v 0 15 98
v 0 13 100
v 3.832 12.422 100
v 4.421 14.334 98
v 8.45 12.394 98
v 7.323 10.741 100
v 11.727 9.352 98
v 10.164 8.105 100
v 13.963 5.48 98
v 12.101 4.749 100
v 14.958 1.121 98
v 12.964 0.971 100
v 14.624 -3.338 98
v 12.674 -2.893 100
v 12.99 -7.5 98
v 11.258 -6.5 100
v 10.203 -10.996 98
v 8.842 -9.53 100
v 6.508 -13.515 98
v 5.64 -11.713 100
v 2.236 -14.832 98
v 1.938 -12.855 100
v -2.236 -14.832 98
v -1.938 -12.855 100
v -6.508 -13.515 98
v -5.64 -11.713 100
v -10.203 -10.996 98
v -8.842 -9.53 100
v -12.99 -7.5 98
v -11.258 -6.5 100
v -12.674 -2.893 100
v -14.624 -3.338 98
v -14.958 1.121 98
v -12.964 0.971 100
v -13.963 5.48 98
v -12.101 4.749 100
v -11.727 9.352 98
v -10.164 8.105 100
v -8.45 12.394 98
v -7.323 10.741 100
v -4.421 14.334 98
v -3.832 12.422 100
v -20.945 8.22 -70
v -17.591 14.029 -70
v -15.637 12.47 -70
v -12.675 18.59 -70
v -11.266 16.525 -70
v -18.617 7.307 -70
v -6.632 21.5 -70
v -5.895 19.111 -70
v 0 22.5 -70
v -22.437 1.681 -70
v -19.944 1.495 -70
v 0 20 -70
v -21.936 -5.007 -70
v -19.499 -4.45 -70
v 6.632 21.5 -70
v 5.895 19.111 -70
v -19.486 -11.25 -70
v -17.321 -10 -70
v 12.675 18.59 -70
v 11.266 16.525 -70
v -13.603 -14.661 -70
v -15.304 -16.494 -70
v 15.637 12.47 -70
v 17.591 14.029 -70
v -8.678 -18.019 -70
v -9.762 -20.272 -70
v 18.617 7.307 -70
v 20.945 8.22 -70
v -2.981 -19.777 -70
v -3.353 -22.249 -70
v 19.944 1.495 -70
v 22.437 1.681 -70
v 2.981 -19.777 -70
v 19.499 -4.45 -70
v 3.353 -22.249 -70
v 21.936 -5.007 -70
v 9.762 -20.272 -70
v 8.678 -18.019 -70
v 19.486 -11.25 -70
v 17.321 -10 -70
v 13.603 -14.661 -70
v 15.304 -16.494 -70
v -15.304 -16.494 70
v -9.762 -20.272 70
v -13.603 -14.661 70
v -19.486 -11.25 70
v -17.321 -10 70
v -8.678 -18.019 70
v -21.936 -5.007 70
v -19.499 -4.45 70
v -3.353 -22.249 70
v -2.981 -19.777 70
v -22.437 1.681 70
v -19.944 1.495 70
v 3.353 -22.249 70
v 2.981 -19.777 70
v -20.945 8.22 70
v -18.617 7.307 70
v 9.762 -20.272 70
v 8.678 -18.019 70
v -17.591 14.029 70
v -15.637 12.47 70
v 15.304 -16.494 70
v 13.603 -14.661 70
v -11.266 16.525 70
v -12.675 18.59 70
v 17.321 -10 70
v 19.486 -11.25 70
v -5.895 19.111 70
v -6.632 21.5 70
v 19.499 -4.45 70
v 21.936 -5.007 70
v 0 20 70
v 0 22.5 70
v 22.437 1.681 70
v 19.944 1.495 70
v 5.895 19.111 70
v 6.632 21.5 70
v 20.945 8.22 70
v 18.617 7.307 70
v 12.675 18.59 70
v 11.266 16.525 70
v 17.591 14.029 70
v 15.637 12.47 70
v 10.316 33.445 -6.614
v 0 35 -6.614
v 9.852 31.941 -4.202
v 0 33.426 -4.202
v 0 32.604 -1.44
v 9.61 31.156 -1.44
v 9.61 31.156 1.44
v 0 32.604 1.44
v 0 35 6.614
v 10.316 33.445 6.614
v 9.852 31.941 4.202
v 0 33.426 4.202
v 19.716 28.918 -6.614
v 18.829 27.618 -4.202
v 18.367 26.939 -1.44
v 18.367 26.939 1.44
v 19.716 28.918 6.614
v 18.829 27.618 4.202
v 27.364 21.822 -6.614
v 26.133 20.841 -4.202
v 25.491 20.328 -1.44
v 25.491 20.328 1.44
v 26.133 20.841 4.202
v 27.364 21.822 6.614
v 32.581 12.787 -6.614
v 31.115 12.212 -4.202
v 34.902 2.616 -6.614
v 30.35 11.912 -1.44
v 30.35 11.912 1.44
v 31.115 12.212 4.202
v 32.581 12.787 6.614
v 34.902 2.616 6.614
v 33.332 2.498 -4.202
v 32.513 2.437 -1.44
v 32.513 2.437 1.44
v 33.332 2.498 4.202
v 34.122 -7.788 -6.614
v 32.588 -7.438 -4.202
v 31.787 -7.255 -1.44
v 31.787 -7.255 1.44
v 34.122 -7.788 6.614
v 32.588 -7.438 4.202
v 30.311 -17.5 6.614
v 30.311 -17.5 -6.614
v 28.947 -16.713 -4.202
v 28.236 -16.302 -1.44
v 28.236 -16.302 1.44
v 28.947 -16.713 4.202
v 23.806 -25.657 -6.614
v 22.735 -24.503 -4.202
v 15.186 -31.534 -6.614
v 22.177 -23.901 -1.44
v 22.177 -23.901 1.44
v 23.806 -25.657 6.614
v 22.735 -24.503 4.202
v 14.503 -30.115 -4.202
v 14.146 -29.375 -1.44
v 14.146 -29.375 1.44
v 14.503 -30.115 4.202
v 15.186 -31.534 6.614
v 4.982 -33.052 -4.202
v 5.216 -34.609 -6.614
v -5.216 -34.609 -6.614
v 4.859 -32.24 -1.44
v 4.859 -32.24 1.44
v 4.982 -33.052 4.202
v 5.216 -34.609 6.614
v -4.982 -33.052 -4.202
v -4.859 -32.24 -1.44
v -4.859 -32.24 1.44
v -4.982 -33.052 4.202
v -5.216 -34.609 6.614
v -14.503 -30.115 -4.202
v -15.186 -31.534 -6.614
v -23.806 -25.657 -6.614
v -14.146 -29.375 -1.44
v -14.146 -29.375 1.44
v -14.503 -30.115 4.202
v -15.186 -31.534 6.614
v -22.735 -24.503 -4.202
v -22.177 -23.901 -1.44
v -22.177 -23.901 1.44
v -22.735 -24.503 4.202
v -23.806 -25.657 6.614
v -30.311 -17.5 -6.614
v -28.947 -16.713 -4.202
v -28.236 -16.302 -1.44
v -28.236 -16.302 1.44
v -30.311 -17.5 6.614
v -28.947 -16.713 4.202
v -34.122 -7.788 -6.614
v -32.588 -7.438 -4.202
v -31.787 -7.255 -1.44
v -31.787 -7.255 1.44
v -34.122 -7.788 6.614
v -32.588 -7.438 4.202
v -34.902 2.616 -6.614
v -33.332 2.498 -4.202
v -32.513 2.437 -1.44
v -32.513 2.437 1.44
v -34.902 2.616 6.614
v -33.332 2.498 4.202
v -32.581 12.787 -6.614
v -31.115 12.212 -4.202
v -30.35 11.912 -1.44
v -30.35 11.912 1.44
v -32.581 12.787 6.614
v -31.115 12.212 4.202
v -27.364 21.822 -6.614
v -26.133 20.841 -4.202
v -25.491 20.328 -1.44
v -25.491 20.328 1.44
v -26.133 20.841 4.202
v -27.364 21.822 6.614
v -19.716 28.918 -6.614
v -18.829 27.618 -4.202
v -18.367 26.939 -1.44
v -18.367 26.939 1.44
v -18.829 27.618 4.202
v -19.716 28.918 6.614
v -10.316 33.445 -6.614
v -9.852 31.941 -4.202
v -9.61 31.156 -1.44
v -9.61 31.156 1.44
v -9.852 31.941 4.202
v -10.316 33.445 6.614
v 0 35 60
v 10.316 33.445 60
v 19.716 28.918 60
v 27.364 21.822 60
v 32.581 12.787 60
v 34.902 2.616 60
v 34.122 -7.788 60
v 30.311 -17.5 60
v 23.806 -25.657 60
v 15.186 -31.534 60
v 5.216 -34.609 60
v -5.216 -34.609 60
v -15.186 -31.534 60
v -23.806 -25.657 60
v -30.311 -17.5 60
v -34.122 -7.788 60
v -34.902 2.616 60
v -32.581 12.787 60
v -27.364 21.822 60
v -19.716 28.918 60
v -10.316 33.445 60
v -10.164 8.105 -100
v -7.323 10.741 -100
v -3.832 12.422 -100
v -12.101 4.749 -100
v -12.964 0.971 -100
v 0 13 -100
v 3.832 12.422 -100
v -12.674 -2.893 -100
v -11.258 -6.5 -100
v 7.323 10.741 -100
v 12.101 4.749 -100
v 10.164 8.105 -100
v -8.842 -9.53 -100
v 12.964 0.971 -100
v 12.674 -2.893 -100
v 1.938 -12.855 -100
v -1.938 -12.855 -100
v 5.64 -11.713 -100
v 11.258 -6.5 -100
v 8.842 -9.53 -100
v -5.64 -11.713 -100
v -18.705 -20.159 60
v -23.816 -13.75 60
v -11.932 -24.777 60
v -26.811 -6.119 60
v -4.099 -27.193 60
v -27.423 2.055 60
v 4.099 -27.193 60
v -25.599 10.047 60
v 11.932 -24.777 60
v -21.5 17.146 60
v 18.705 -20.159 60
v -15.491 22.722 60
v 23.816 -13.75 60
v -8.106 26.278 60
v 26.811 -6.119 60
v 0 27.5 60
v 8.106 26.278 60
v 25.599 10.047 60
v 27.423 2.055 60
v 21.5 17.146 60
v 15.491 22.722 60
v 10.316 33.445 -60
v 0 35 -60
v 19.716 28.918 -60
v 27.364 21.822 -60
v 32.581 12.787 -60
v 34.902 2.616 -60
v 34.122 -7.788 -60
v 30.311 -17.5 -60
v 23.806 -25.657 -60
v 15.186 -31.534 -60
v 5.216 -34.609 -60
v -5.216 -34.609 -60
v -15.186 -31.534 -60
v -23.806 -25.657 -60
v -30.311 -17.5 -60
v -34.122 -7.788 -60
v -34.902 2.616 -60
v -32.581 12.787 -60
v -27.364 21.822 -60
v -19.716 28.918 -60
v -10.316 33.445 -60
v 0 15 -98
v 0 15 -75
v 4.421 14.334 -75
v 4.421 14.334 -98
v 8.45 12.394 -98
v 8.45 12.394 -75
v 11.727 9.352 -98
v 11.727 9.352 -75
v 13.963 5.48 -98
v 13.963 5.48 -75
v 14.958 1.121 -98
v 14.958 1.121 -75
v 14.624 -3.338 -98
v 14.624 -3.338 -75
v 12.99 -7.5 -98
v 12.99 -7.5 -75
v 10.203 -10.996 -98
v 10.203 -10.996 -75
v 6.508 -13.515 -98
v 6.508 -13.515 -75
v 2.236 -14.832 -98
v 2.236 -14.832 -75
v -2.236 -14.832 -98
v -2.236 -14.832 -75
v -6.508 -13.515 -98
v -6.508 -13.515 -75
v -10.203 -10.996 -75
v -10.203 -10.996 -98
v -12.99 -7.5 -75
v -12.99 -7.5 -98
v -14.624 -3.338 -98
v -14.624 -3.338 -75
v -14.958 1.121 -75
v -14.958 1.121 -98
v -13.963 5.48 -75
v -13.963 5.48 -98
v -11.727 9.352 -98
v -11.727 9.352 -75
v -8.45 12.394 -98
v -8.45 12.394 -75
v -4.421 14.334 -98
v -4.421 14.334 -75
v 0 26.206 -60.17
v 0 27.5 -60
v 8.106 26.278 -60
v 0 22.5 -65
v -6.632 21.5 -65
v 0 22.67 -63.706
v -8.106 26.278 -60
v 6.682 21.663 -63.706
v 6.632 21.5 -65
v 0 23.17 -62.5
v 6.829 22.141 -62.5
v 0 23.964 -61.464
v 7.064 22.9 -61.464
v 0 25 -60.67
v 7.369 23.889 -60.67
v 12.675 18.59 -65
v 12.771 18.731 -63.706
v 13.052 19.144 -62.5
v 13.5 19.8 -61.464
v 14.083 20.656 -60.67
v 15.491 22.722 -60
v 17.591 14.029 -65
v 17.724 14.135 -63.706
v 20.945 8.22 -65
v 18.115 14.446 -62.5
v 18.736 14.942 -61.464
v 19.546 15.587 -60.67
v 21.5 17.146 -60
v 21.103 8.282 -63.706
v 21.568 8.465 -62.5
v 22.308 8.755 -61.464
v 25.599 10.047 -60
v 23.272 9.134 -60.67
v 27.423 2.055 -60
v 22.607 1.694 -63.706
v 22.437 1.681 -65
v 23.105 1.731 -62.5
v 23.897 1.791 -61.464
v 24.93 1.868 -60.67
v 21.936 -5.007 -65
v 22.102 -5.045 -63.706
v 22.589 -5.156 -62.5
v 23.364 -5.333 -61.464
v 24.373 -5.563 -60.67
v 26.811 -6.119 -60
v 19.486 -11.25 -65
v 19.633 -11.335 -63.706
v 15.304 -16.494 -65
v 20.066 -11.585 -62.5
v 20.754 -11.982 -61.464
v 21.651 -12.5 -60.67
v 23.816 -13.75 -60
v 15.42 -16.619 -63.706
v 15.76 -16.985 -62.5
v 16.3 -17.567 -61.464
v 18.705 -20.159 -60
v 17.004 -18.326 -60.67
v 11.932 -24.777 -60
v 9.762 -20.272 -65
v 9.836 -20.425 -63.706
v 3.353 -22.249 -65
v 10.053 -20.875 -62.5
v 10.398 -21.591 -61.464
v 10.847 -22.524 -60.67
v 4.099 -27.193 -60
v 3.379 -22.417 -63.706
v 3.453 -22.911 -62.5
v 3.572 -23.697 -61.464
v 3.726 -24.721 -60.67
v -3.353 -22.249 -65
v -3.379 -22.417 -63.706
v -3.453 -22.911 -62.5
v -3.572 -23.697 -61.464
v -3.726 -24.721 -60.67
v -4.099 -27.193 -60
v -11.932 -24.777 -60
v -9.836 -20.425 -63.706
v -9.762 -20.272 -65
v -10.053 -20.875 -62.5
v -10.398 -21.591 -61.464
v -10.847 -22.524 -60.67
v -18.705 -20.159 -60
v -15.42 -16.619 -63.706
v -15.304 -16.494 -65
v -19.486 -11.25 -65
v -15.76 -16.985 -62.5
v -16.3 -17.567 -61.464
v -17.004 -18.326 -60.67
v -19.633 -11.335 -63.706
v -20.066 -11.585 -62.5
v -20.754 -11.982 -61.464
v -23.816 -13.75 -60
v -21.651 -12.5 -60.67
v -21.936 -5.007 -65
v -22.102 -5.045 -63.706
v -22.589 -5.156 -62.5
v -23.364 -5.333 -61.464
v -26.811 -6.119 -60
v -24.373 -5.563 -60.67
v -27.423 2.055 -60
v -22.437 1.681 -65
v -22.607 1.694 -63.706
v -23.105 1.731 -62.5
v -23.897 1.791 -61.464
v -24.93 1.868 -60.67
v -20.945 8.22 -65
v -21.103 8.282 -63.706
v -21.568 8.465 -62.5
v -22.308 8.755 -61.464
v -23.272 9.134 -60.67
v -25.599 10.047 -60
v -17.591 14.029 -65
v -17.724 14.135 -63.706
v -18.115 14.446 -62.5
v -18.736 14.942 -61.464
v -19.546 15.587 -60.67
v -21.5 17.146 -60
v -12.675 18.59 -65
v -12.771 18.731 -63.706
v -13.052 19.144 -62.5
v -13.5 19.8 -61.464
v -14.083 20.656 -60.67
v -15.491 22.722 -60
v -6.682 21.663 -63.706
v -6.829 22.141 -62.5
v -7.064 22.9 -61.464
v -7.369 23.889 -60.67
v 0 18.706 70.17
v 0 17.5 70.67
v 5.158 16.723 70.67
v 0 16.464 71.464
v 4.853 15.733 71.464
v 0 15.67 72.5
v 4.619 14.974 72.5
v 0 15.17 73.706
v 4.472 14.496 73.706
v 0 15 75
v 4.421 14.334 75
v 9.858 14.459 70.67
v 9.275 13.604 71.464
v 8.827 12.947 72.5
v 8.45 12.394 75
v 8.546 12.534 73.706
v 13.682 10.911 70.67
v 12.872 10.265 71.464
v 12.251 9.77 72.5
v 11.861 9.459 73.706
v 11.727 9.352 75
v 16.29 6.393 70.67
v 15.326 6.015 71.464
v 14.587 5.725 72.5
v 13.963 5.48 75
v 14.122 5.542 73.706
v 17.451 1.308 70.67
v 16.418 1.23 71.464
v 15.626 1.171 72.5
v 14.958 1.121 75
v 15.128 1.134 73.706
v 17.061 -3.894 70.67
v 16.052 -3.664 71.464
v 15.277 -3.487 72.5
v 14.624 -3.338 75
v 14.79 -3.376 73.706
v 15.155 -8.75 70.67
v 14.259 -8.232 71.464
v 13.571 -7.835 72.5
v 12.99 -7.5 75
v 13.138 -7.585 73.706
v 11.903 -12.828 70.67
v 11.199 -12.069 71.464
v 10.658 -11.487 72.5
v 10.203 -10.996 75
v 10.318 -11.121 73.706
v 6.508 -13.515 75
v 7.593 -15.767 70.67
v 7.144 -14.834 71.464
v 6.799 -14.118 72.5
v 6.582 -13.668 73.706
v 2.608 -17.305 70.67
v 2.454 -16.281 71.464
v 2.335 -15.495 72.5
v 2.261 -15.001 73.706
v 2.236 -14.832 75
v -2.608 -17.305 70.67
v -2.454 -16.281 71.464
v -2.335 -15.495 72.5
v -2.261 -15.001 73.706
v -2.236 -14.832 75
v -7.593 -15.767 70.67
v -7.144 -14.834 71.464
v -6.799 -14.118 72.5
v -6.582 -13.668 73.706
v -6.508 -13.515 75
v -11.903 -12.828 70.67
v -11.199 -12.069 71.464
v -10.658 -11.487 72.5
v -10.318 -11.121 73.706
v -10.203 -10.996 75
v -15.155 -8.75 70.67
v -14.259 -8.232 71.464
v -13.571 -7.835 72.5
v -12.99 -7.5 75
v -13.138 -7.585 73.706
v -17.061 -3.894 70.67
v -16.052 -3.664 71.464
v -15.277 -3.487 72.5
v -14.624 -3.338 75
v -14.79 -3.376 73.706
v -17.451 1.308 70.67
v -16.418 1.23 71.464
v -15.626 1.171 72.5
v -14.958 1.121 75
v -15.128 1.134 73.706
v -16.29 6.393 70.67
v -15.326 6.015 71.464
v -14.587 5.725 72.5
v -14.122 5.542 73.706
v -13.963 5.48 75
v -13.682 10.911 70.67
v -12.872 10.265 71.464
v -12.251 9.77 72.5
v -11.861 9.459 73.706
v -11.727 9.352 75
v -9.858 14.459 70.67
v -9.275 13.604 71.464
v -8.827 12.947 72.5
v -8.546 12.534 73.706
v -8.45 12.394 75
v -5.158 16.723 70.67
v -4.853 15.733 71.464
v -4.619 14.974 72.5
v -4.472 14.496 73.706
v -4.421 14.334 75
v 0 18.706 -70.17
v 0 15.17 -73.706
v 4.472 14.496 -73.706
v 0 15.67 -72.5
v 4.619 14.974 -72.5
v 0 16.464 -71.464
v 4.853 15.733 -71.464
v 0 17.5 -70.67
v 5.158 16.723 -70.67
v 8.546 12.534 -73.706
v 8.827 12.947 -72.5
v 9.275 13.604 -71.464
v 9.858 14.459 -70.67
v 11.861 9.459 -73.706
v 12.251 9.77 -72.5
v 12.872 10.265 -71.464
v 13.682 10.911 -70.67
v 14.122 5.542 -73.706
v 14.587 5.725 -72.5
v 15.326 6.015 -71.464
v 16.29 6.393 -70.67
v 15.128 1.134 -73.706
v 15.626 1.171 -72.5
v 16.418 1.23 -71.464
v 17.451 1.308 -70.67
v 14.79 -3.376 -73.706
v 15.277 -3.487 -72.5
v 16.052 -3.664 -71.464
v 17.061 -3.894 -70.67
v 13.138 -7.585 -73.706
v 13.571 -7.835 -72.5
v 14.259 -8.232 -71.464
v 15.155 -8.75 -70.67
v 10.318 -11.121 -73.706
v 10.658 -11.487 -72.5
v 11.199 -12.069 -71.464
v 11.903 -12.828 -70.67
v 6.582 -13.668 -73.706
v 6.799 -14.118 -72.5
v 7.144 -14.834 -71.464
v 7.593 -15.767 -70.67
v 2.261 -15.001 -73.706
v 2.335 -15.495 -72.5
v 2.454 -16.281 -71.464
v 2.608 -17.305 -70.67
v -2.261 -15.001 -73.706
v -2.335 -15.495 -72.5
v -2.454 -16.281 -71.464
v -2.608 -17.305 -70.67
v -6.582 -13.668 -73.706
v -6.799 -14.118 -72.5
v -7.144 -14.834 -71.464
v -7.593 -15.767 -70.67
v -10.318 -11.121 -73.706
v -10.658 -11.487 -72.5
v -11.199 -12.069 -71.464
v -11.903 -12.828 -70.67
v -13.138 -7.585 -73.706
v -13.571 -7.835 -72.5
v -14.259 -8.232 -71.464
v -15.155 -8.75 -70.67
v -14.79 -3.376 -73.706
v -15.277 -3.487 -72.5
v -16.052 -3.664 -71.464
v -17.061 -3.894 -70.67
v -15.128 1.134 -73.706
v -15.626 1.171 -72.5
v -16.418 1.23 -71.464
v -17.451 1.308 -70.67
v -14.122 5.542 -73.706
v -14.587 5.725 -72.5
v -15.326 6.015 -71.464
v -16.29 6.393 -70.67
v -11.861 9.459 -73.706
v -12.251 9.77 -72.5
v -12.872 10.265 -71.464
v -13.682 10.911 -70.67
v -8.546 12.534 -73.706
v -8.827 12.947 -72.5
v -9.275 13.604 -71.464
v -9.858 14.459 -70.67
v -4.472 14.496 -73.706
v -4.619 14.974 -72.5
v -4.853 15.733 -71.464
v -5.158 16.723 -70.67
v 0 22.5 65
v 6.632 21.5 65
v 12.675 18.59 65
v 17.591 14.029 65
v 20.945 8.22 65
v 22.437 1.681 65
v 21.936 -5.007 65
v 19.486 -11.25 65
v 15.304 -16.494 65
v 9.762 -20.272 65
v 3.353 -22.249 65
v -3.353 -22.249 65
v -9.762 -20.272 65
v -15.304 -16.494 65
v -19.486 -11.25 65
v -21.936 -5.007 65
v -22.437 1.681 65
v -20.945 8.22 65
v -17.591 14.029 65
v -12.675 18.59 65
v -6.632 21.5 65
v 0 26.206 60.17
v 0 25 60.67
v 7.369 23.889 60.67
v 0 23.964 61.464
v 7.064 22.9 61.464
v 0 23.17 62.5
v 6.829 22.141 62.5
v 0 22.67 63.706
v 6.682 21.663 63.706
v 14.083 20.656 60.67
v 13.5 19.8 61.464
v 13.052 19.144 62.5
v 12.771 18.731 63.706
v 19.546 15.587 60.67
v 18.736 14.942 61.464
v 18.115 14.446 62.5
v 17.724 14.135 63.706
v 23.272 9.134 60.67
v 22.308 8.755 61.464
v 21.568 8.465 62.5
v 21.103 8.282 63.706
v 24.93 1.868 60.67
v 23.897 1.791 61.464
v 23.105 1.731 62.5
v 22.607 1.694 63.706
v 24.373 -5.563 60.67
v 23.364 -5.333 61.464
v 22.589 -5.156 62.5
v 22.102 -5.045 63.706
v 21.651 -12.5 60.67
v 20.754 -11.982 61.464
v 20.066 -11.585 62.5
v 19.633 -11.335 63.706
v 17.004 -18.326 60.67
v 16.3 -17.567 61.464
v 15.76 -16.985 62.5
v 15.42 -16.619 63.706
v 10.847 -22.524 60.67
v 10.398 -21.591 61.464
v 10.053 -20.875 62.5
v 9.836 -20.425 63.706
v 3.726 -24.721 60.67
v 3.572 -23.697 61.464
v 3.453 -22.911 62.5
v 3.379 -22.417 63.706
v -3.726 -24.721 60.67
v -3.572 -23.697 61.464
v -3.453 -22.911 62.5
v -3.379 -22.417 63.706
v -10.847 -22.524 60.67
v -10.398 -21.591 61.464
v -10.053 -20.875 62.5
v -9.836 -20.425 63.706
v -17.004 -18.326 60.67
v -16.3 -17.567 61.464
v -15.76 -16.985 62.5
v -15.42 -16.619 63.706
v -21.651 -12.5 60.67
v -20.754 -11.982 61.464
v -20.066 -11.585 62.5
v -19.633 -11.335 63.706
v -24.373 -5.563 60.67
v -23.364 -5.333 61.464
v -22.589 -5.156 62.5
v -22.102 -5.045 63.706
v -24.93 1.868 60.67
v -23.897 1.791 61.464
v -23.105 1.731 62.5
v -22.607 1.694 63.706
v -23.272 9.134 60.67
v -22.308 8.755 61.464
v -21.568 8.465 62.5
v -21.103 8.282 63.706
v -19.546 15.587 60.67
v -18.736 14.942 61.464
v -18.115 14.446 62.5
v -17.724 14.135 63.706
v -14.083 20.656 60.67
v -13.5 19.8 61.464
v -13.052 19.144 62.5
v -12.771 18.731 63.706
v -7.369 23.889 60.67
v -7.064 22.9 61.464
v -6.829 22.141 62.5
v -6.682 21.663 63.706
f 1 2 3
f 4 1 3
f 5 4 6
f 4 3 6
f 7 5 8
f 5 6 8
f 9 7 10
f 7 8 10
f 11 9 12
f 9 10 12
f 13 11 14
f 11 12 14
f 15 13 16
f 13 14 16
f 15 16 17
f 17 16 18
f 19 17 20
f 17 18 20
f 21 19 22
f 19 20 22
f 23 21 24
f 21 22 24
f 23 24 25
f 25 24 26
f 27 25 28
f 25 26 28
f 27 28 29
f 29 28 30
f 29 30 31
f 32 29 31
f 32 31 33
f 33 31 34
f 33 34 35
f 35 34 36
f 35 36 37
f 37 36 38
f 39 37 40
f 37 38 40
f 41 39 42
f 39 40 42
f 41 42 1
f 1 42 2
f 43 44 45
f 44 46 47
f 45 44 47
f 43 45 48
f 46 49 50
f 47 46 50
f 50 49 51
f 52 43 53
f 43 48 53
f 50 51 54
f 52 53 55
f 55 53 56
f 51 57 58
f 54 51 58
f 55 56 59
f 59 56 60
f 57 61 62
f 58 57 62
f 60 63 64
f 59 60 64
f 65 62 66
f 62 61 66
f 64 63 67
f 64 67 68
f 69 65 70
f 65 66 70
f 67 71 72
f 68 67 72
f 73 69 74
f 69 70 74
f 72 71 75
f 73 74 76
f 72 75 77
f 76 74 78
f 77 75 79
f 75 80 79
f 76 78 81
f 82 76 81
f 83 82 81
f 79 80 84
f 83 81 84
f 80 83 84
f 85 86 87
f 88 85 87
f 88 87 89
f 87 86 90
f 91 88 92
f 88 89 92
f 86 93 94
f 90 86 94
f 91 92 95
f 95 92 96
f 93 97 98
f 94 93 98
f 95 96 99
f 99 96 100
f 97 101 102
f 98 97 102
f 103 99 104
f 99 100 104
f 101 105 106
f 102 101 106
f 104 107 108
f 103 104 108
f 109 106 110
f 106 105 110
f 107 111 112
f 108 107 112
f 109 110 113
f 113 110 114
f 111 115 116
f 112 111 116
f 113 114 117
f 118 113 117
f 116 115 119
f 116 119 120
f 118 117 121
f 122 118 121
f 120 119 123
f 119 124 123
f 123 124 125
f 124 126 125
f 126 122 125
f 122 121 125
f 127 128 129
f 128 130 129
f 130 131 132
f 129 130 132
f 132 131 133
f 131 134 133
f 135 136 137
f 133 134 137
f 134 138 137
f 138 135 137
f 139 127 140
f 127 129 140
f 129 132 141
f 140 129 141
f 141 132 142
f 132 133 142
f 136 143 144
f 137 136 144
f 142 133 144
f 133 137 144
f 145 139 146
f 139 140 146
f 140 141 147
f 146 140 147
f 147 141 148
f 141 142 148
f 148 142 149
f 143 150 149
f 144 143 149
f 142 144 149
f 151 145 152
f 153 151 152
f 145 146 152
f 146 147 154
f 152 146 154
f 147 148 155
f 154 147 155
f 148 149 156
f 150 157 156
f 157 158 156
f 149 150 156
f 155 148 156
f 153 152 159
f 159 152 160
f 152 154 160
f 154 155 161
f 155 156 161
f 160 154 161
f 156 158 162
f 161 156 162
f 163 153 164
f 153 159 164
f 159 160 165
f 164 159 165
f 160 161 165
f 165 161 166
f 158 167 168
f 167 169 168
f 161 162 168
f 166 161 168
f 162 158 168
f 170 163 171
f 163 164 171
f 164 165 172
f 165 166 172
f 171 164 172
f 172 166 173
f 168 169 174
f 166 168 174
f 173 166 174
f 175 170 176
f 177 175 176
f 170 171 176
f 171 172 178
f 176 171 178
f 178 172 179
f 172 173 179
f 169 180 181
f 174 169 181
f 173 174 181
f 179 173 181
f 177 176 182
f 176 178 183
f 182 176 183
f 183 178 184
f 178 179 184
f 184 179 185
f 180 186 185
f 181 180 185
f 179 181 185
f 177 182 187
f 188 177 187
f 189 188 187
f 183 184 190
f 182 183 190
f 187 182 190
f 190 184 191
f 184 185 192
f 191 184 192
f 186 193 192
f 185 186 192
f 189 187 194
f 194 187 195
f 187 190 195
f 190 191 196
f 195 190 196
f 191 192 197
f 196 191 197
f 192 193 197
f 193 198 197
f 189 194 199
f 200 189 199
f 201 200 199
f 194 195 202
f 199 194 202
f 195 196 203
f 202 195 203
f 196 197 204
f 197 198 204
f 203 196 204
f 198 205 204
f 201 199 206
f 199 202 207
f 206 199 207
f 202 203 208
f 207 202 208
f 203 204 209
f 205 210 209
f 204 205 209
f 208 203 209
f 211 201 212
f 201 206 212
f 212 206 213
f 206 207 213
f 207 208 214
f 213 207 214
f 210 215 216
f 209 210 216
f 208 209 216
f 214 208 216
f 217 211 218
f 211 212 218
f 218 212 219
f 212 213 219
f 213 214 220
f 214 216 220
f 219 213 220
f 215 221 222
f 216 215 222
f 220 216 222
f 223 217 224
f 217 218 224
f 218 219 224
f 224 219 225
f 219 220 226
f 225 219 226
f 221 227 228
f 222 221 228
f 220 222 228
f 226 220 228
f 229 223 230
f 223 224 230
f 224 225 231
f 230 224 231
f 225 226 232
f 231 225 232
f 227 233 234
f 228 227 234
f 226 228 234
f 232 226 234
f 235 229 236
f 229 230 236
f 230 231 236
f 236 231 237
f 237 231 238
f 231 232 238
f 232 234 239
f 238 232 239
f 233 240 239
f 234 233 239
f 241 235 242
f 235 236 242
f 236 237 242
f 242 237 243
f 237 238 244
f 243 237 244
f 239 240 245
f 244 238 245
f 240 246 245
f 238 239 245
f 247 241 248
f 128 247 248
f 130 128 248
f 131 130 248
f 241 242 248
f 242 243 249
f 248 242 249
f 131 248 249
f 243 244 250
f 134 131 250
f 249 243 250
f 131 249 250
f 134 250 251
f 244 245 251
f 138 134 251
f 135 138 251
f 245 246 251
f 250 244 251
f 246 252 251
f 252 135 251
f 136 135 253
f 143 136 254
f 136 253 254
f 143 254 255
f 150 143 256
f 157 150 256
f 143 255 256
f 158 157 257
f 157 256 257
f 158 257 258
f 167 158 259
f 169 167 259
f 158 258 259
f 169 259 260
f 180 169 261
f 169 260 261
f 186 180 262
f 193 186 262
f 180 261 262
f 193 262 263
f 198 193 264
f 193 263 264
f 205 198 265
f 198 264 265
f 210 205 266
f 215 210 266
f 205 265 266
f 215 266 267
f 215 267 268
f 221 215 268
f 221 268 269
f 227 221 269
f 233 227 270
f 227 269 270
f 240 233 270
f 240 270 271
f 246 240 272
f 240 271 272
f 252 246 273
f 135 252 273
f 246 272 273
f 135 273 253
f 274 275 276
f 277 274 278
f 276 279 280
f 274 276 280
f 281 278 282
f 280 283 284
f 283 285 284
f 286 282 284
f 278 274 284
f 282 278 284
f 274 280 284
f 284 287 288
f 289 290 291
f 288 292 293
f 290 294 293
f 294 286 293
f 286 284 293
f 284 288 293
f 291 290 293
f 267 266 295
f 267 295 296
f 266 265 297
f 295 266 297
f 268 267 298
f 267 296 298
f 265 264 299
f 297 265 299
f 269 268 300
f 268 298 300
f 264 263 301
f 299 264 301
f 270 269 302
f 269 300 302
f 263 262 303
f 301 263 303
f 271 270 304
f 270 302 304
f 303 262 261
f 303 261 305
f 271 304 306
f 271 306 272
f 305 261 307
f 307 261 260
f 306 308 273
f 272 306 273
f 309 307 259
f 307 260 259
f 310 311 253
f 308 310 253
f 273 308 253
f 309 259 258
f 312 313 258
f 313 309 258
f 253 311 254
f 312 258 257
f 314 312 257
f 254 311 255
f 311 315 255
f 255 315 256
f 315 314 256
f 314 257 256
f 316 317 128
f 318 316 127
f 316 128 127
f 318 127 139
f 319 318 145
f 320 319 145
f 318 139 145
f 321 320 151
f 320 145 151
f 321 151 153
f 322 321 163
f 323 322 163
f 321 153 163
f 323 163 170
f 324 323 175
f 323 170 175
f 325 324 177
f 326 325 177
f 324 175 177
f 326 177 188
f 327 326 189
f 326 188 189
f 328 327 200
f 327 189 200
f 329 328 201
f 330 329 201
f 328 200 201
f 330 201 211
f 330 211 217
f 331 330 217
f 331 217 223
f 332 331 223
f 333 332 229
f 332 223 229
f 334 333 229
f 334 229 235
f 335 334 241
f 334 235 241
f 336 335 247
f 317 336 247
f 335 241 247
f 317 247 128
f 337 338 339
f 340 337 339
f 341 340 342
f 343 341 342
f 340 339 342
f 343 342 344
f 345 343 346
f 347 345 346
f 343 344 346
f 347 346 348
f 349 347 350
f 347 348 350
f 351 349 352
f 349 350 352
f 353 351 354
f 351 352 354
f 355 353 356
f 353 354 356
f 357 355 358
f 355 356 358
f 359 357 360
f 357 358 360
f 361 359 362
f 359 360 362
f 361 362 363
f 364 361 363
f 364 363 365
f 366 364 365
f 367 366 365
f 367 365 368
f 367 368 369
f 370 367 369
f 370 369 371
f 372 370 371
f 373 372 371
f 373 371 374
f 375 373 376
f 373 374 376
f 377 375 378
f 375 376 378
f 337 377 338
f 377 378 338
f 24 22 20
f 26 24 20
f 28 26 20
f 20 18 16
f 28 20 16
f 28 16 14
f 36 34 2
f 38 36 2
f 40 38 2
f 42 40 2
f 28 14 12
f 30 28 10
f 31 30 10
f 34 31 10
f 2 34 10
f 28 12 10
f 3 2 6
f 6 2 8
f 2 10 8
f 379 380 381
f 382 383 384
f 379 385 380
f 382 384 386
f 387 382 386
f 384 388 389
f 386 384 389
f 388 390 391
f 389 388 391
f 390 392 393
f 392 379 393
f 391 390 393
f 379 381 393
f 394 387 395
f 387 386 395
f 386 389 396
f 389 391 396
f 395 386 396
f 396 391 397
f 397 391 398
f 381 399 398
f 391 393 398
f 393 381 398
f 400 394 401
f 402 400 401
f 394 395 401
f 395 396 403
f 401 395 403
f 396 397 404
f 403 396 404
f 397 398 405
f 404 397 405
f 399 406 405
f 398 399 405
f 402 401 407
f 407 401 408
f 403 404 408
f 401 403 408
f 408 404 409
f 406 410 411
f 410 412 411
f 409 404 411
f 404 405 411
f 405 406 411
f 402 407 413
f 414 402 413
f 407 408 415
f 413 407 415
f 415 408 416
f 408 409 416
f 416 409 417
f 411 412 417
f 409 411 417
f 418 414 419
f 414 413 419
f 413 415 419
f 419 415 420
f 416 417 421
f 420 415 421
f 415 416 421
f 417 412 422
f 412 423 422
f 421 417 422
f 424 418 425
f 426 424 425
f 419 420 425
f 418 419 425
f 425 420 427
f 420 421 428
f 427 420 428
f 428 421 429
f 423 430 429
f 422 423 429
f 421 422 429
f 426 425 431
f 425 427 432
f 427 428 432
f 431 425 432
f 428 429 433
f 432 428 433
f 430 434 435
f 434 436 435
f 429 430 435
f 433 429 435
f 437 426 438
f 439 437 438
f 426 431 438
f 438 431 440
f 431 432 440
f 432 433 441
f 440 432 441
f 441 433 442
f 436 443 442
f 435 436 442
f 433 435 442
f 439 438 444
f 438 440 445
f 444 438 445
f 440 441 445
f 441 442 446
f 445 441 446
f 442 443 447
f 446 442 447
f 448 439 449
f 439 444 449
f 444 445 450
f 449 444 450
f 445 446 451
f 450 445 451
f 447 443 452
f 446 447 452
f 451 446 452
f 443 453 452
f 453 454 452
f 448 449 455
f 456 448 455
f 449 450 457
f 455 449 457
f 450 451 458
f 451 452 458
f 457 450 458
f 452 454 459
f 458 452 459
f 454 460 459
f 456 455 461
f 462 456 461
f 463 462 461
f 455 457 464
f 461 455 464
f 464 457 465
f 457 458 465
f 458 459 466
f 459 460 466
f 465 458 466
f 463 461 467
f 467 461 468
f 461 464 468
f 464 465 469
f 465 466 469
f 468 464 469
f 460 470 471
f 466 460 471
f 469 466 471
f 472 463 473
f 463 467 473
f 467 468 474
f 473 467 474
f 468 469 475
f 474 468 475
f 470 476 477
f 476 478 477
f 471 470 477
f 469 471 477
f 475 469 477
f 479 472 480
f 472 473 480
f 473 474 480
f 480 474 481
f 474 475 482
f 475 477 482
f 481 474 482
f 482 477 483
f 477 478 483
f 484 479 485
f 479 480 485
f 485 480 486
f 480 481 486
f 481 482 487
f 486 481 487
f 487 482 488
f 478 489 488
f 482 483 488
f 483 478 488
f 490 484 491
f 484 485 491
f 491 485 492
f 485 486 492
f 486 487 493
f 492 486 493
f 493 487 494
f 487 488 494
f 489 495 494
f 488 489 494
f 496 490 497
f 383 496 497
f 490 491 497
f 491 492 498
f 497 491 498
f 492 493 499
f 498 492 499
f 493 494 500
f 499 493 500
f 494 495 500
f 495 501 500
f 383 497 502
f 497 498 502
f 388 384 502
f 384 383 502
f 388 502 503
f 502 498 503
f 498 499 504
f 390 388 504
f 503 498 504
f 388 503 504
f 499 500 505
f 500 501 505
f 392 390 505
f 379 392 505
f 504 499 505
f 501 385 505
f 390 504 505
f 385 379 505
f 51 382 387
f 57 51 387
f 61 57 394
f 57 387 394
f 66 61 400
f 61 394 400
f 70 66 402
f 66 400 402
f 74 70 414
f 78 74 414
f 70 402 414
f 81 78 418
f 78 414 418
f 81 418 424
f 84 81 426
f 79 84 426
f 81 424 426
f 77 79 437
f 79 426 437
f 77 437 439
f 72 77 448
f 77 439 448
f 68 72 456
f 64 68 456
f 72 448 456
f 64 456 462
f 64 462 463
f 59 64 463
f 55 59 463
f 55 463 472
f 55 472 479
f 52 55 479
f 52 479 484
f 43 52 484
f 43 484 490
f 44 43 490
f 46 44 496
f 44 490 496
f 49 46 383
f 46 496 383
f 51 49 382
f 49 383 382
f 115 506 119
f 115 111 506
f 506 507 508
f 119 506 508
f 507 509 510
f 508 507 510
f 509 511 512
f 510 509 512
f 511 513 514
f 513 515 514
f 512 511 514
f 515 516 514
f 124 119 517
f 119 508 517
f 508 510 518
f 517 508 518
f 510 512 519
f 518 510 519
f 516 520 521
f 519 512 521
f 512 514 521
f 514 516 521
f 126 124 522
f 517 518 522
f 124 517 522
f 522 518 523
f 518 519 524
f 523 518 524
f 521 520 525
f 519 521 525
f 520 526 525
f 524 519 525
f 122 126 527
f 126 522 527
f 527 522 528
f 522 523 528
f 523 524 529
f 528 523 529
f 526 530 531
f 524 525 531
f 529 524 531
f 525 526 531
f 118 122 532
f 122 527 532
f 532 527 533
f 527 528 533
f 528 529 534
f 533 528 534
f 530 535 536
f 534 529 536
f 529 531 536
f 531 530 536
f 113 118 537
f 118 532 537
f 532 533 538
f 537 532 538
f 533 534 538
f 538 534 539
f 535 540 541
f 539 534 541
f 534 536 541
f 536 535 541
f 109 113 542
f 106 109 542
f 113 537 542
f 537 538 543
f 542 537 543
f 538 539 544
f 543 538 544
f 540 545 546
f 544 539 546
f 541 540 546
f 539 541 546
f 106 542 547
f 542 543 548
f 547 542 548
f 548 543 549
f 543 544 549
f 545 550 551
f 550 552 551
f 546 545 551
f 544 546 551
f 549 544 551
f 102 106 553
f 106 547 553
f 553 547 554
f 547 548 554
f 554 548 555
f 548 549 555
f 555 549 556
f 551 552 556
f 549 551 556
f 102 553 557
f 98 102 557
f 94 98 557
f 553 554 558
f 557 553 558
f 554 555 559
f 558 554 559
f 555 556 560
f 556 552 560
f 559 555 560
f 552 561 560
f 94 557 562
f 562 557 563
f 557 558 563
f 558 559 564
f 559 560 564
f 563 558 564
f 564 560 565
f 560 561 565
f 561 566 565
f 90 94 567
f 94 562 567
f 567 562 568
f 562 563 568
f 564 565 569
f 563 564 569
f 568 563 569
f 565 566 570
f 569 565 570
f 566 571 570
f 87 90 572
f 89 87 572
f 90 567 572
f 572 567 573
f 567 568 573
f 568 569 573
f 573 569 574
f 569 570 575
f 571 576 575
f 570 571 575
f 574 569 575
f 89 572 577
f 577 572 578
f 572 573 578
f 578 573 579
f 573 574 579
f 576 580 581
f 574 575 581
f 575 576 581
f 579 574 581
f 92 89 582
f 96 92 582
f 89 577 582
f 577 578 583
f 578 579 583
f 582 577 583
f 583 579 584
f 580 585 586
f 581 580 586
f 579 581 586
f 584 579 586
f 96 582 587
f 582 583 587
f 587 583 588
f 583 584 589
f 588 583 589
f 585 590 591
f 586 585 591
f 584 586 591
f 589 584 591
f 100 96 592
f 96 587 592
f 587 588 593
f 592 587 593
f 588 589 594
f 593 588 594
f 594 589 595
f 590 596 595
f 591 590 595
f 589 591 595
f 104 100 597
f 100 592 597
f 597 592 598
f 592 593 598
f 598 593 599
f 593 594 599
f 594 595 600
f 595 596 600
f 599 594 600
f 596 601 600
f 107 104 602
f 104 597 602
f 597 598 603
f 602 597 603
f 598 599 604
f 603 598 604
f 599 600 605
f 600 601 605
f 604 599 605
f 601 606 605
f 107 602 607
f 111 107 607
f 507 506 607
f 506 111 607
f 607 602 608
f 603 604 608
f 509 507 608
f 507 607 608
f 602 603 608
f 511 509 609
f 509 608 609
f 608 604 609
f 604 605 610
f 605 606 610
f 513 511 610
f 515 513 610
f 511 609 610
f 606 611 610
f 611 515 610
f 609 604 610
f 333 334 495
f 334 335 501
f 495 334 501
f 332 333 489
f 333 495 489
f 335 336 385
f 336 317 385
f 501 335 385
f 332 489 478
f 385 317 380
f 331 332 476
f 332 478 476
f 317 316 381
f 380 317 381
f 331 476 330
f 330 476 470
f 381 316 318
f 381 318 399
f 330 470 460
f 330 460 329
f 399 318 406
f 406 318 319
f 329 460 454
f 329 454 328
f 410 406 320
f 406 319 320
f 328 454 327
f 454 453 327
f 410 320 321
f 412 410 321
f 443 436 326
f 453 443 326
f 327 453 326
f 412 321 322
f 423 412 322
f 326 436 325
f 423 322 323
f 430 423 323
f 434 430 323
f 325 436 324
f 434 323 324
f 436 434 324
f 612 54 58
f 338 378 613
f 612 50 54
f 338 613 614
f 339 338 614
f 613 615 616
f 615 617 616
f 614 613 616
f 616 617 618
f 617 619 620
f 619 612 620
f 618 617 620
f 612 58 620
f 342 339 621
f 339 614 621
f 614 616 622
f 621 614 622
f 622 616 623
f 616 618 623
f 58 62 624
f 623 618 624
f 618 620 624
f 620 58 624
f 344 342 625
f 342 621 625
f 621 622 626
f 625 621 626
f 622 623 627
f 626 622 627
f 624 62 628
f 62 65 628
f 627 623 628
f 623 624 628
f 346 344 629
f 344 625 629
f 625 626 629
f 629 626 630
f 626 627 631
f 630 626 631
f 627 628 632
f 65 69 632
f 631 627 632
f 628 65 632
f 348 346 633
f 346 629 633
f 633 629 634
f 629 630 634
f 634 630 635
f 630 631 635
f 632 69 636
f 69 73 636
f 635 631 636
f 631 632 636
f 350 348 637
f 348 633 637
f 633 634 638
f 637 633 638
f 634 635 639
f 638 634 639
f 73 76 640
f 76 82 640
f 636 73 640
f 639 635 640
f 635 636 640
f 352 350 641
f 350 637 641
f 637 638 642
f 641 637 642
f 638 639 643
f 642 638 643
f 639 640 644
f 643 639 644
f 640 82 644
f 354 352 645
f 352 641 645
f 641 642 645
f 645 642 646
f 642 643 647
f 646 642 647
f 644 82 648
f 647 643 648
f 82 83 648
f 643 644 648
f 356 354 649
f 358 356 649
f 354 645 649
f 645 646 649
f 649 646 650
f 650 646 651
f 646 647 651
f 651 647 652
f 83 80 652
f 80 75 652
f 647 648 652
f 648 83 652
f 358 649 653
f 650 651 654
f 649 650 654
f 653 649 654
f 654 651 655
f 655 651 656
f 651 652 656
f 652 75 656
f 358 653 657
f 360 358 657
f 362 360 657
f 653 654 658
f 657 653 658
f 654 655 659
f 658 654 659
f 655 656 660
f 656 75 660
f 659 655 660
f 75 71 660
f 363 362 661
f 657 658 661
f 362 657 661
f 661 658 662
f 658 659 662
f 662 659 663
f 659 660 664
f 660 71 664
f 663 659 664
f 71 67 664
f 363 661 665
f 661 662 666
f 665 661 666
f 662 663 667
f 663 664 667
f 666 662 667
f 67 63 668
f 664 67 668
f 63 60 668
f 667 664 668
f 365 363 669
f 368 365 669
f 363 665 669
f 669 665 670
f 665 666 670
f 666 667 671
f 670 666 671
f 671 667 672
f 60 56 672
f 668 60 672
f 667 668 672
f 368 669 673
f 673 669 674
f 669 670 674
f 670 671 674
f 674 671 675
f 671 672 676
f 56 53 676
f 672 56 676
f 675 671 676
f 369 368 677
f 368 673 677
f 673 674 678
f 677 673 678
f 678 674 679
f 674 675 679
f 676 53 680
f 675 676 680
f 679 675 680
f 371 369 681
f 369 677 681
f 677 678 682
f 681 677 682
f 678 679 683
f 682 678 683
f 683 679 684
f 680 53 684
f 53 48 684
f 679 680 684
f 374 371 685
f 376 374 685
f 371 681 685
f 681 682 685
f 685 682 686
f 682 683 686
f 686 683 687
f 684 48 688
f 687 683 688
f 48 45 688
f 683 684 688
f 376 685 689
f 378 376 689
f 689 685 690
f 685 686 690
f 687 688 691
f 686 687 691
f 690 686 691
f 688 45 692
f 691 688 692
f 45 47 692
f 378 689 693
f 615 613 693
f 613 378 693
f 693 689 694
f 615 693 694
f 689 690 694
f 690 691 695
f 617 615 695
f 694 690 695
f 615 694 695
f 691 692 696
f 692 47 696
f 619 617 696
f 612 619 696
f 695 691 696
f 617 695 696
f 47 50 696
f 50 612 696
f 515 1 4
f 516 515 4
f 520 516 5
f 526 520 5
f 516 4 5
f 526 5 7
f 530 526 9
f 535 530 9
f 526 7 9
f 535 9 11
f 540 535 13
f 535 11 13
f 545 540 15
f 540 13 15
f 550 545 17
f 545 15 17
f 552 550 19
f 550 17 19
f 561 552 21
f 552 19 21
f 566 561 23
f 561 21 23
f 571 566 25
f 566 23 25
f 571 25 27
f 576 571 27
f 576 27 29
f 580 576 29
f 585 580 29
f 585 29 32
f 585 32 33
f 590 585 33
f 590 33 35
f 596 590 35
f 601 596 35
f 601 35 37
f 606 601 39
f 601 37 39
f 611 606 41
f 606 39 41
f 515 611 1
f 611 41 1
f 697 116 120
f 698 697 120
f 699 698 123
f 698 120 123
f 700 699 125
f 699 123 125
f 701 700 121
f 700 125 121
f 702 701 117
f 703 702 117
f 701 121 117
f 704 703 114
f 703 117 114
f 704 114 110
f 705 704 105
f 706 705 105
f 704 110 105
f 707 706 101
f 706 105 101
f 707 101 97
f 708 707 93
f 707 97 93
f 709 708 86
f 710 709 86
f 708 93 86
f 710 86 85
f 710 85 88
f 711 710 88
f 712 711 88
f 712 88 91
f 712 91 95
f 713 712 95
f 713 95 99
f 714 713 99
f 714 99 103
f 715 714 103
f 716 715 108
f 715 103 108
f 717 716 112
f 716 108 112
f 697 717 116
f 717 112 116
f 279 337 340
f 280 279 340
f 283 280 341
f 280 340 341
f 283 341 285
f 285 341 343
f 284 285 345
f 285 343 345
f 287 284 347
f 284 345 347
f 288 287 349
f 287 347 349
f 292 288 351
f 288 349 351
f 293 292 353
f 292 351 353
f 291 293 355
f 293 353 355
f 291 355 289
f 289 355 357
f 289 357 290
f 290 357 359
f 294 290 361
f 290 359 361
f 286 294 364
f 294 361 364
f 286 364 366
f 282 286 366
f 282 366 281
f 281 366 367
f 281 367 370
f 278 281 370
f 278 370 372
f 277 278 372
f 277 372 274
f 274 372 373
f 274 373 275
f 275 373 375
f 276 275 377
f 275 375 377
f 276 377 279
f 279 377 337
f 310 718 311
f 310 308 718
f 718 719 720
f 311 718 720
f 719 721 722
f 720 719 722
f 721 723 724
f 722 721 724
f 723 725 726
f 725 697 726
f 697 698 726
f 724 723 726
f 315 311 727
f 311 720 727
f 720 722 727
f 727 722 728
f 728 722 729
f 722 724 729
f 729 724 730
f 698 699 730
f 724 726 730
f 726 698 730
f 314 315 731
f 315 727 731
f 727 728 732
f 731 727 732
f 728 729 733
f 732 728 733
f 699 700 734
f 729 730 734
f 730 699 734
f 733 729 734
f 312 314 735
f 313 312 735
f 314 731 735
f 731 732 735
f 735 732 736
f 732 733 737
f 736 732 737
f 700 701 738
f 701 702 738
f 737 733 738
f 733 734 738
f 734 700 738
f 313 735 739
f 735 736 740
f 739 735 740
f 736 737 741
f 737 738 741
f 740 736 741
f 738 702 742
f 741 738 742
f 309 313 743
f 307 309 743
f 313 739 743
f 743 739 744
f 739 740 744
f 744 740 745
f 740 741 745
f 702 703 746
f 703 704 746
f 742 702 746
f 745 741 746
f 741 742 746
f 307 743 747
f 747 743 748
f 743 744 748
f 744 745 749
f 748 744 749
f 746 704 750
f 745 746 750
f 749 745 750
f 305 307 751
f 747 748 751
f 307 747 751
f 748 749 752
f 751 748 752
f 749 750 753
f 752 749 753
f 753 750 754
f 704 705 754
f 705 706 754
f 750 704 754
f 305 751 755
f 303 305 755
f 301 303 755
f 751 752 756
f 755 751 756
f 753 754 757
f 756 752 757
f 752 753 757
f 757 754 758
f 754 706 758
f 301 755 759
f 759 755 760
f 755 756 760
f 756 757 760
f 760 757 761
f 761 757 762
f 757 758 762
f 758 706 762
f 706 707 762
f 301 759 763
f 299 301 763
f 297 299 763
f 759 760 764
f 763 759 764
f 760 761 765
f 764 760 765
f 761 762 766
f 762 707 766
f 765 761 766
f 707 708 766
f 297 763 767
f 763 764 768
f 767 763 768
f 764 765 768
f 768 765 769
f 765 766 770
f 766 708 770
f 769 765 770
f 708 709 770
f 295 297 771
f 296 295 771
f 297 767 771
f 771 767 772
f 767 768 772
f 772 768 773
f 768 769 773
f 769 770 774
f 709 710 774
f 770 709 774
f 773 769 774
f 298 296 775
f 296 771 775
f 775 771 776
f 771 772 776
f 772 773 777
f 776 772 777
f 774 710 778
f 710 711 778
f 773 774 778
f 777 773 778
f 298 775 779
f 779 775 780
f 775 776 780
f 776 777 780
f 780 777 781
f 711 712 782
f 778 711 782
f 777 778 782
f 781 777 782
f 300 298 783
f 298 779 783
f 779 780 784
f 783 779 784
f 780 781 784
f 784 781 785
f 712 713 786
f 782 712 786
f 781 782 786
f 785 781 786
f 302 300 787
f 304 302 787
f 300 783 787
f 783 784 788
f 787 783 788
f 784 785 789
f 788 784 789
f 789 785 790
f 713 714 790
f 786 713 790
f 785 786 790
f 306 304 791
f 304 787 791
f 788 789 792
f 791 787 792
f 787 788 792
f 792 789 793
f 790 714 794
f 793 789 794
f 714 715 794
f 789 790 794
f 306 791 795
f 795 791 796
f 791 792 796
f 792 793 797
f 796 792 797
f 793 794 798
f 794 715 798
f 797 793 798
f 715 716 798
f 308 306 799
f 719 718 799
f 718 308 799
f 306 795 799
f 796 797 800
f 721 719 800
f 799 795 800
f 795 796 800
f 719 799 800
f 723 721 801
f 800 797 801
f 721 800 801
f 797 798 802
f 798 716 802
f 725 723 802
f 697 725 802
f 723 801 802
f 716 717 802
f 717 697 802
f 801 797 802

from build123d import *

# Parameters (mm, degrees)
CHANFRO1_SIZE = 2
FILETE1_R     = 5


with BuildPart() as part:
    # Esboço1 → Revolução1 (revolve)
    with BuildSketch(Plane(origin=(0, 0, 0), x_dir=(0, 0, -1), z_dir=(1, 0, 0))):
        with BuildLine():
            Line((100, 0), (100, 15))
            Line((100, 15), (70, 15))
            Line((70, 15), (70, 22.5))
            Line((70, 22.5), (60, 22.5))
            Line((60, 22.5), (60, 35))
            Line((60, 35), (6.614378278, 35))
            ThreePointArc((6.614378278, 35), (0, 32.5), (-6.614378278, 35))
            Line((-6.614378278, 35), (-60, 35))
            Line((-60, 35), (-60, 22.5))
            Line((-60, 22.5), (-70, 22.5))
            Line((-70, 22.5), (-70, 15))
            Line((-70, 15), (-100, 15))
            Line((-100, 15), (-100, 0))
            Line((-100, 0), (100, 0))
        make_face()
    revolve(axis=Axis((0, 0, 100), (0, 0, -1)))

    # Chanfro1
    chanfro1_edges = [part.edges().sort_by_distance(p)[0] for p in [
        (0, -15, 100),
        (0, -15, -100),
    ]]
    chamfer(chanfro1_edges, length=CHANFRO1_SIZE)

    # Filete1
    filete1_edges = [part.edges().sort_by_distance(p)[0] for p in [
        (0, -15, 70),
        (0, -22.5, 60),
        (0, -22.5, -60),
        (0, -15, -70),
    ]]
    fillet(filete1_edges, radius=FILETE1_R)


solid = part.part
